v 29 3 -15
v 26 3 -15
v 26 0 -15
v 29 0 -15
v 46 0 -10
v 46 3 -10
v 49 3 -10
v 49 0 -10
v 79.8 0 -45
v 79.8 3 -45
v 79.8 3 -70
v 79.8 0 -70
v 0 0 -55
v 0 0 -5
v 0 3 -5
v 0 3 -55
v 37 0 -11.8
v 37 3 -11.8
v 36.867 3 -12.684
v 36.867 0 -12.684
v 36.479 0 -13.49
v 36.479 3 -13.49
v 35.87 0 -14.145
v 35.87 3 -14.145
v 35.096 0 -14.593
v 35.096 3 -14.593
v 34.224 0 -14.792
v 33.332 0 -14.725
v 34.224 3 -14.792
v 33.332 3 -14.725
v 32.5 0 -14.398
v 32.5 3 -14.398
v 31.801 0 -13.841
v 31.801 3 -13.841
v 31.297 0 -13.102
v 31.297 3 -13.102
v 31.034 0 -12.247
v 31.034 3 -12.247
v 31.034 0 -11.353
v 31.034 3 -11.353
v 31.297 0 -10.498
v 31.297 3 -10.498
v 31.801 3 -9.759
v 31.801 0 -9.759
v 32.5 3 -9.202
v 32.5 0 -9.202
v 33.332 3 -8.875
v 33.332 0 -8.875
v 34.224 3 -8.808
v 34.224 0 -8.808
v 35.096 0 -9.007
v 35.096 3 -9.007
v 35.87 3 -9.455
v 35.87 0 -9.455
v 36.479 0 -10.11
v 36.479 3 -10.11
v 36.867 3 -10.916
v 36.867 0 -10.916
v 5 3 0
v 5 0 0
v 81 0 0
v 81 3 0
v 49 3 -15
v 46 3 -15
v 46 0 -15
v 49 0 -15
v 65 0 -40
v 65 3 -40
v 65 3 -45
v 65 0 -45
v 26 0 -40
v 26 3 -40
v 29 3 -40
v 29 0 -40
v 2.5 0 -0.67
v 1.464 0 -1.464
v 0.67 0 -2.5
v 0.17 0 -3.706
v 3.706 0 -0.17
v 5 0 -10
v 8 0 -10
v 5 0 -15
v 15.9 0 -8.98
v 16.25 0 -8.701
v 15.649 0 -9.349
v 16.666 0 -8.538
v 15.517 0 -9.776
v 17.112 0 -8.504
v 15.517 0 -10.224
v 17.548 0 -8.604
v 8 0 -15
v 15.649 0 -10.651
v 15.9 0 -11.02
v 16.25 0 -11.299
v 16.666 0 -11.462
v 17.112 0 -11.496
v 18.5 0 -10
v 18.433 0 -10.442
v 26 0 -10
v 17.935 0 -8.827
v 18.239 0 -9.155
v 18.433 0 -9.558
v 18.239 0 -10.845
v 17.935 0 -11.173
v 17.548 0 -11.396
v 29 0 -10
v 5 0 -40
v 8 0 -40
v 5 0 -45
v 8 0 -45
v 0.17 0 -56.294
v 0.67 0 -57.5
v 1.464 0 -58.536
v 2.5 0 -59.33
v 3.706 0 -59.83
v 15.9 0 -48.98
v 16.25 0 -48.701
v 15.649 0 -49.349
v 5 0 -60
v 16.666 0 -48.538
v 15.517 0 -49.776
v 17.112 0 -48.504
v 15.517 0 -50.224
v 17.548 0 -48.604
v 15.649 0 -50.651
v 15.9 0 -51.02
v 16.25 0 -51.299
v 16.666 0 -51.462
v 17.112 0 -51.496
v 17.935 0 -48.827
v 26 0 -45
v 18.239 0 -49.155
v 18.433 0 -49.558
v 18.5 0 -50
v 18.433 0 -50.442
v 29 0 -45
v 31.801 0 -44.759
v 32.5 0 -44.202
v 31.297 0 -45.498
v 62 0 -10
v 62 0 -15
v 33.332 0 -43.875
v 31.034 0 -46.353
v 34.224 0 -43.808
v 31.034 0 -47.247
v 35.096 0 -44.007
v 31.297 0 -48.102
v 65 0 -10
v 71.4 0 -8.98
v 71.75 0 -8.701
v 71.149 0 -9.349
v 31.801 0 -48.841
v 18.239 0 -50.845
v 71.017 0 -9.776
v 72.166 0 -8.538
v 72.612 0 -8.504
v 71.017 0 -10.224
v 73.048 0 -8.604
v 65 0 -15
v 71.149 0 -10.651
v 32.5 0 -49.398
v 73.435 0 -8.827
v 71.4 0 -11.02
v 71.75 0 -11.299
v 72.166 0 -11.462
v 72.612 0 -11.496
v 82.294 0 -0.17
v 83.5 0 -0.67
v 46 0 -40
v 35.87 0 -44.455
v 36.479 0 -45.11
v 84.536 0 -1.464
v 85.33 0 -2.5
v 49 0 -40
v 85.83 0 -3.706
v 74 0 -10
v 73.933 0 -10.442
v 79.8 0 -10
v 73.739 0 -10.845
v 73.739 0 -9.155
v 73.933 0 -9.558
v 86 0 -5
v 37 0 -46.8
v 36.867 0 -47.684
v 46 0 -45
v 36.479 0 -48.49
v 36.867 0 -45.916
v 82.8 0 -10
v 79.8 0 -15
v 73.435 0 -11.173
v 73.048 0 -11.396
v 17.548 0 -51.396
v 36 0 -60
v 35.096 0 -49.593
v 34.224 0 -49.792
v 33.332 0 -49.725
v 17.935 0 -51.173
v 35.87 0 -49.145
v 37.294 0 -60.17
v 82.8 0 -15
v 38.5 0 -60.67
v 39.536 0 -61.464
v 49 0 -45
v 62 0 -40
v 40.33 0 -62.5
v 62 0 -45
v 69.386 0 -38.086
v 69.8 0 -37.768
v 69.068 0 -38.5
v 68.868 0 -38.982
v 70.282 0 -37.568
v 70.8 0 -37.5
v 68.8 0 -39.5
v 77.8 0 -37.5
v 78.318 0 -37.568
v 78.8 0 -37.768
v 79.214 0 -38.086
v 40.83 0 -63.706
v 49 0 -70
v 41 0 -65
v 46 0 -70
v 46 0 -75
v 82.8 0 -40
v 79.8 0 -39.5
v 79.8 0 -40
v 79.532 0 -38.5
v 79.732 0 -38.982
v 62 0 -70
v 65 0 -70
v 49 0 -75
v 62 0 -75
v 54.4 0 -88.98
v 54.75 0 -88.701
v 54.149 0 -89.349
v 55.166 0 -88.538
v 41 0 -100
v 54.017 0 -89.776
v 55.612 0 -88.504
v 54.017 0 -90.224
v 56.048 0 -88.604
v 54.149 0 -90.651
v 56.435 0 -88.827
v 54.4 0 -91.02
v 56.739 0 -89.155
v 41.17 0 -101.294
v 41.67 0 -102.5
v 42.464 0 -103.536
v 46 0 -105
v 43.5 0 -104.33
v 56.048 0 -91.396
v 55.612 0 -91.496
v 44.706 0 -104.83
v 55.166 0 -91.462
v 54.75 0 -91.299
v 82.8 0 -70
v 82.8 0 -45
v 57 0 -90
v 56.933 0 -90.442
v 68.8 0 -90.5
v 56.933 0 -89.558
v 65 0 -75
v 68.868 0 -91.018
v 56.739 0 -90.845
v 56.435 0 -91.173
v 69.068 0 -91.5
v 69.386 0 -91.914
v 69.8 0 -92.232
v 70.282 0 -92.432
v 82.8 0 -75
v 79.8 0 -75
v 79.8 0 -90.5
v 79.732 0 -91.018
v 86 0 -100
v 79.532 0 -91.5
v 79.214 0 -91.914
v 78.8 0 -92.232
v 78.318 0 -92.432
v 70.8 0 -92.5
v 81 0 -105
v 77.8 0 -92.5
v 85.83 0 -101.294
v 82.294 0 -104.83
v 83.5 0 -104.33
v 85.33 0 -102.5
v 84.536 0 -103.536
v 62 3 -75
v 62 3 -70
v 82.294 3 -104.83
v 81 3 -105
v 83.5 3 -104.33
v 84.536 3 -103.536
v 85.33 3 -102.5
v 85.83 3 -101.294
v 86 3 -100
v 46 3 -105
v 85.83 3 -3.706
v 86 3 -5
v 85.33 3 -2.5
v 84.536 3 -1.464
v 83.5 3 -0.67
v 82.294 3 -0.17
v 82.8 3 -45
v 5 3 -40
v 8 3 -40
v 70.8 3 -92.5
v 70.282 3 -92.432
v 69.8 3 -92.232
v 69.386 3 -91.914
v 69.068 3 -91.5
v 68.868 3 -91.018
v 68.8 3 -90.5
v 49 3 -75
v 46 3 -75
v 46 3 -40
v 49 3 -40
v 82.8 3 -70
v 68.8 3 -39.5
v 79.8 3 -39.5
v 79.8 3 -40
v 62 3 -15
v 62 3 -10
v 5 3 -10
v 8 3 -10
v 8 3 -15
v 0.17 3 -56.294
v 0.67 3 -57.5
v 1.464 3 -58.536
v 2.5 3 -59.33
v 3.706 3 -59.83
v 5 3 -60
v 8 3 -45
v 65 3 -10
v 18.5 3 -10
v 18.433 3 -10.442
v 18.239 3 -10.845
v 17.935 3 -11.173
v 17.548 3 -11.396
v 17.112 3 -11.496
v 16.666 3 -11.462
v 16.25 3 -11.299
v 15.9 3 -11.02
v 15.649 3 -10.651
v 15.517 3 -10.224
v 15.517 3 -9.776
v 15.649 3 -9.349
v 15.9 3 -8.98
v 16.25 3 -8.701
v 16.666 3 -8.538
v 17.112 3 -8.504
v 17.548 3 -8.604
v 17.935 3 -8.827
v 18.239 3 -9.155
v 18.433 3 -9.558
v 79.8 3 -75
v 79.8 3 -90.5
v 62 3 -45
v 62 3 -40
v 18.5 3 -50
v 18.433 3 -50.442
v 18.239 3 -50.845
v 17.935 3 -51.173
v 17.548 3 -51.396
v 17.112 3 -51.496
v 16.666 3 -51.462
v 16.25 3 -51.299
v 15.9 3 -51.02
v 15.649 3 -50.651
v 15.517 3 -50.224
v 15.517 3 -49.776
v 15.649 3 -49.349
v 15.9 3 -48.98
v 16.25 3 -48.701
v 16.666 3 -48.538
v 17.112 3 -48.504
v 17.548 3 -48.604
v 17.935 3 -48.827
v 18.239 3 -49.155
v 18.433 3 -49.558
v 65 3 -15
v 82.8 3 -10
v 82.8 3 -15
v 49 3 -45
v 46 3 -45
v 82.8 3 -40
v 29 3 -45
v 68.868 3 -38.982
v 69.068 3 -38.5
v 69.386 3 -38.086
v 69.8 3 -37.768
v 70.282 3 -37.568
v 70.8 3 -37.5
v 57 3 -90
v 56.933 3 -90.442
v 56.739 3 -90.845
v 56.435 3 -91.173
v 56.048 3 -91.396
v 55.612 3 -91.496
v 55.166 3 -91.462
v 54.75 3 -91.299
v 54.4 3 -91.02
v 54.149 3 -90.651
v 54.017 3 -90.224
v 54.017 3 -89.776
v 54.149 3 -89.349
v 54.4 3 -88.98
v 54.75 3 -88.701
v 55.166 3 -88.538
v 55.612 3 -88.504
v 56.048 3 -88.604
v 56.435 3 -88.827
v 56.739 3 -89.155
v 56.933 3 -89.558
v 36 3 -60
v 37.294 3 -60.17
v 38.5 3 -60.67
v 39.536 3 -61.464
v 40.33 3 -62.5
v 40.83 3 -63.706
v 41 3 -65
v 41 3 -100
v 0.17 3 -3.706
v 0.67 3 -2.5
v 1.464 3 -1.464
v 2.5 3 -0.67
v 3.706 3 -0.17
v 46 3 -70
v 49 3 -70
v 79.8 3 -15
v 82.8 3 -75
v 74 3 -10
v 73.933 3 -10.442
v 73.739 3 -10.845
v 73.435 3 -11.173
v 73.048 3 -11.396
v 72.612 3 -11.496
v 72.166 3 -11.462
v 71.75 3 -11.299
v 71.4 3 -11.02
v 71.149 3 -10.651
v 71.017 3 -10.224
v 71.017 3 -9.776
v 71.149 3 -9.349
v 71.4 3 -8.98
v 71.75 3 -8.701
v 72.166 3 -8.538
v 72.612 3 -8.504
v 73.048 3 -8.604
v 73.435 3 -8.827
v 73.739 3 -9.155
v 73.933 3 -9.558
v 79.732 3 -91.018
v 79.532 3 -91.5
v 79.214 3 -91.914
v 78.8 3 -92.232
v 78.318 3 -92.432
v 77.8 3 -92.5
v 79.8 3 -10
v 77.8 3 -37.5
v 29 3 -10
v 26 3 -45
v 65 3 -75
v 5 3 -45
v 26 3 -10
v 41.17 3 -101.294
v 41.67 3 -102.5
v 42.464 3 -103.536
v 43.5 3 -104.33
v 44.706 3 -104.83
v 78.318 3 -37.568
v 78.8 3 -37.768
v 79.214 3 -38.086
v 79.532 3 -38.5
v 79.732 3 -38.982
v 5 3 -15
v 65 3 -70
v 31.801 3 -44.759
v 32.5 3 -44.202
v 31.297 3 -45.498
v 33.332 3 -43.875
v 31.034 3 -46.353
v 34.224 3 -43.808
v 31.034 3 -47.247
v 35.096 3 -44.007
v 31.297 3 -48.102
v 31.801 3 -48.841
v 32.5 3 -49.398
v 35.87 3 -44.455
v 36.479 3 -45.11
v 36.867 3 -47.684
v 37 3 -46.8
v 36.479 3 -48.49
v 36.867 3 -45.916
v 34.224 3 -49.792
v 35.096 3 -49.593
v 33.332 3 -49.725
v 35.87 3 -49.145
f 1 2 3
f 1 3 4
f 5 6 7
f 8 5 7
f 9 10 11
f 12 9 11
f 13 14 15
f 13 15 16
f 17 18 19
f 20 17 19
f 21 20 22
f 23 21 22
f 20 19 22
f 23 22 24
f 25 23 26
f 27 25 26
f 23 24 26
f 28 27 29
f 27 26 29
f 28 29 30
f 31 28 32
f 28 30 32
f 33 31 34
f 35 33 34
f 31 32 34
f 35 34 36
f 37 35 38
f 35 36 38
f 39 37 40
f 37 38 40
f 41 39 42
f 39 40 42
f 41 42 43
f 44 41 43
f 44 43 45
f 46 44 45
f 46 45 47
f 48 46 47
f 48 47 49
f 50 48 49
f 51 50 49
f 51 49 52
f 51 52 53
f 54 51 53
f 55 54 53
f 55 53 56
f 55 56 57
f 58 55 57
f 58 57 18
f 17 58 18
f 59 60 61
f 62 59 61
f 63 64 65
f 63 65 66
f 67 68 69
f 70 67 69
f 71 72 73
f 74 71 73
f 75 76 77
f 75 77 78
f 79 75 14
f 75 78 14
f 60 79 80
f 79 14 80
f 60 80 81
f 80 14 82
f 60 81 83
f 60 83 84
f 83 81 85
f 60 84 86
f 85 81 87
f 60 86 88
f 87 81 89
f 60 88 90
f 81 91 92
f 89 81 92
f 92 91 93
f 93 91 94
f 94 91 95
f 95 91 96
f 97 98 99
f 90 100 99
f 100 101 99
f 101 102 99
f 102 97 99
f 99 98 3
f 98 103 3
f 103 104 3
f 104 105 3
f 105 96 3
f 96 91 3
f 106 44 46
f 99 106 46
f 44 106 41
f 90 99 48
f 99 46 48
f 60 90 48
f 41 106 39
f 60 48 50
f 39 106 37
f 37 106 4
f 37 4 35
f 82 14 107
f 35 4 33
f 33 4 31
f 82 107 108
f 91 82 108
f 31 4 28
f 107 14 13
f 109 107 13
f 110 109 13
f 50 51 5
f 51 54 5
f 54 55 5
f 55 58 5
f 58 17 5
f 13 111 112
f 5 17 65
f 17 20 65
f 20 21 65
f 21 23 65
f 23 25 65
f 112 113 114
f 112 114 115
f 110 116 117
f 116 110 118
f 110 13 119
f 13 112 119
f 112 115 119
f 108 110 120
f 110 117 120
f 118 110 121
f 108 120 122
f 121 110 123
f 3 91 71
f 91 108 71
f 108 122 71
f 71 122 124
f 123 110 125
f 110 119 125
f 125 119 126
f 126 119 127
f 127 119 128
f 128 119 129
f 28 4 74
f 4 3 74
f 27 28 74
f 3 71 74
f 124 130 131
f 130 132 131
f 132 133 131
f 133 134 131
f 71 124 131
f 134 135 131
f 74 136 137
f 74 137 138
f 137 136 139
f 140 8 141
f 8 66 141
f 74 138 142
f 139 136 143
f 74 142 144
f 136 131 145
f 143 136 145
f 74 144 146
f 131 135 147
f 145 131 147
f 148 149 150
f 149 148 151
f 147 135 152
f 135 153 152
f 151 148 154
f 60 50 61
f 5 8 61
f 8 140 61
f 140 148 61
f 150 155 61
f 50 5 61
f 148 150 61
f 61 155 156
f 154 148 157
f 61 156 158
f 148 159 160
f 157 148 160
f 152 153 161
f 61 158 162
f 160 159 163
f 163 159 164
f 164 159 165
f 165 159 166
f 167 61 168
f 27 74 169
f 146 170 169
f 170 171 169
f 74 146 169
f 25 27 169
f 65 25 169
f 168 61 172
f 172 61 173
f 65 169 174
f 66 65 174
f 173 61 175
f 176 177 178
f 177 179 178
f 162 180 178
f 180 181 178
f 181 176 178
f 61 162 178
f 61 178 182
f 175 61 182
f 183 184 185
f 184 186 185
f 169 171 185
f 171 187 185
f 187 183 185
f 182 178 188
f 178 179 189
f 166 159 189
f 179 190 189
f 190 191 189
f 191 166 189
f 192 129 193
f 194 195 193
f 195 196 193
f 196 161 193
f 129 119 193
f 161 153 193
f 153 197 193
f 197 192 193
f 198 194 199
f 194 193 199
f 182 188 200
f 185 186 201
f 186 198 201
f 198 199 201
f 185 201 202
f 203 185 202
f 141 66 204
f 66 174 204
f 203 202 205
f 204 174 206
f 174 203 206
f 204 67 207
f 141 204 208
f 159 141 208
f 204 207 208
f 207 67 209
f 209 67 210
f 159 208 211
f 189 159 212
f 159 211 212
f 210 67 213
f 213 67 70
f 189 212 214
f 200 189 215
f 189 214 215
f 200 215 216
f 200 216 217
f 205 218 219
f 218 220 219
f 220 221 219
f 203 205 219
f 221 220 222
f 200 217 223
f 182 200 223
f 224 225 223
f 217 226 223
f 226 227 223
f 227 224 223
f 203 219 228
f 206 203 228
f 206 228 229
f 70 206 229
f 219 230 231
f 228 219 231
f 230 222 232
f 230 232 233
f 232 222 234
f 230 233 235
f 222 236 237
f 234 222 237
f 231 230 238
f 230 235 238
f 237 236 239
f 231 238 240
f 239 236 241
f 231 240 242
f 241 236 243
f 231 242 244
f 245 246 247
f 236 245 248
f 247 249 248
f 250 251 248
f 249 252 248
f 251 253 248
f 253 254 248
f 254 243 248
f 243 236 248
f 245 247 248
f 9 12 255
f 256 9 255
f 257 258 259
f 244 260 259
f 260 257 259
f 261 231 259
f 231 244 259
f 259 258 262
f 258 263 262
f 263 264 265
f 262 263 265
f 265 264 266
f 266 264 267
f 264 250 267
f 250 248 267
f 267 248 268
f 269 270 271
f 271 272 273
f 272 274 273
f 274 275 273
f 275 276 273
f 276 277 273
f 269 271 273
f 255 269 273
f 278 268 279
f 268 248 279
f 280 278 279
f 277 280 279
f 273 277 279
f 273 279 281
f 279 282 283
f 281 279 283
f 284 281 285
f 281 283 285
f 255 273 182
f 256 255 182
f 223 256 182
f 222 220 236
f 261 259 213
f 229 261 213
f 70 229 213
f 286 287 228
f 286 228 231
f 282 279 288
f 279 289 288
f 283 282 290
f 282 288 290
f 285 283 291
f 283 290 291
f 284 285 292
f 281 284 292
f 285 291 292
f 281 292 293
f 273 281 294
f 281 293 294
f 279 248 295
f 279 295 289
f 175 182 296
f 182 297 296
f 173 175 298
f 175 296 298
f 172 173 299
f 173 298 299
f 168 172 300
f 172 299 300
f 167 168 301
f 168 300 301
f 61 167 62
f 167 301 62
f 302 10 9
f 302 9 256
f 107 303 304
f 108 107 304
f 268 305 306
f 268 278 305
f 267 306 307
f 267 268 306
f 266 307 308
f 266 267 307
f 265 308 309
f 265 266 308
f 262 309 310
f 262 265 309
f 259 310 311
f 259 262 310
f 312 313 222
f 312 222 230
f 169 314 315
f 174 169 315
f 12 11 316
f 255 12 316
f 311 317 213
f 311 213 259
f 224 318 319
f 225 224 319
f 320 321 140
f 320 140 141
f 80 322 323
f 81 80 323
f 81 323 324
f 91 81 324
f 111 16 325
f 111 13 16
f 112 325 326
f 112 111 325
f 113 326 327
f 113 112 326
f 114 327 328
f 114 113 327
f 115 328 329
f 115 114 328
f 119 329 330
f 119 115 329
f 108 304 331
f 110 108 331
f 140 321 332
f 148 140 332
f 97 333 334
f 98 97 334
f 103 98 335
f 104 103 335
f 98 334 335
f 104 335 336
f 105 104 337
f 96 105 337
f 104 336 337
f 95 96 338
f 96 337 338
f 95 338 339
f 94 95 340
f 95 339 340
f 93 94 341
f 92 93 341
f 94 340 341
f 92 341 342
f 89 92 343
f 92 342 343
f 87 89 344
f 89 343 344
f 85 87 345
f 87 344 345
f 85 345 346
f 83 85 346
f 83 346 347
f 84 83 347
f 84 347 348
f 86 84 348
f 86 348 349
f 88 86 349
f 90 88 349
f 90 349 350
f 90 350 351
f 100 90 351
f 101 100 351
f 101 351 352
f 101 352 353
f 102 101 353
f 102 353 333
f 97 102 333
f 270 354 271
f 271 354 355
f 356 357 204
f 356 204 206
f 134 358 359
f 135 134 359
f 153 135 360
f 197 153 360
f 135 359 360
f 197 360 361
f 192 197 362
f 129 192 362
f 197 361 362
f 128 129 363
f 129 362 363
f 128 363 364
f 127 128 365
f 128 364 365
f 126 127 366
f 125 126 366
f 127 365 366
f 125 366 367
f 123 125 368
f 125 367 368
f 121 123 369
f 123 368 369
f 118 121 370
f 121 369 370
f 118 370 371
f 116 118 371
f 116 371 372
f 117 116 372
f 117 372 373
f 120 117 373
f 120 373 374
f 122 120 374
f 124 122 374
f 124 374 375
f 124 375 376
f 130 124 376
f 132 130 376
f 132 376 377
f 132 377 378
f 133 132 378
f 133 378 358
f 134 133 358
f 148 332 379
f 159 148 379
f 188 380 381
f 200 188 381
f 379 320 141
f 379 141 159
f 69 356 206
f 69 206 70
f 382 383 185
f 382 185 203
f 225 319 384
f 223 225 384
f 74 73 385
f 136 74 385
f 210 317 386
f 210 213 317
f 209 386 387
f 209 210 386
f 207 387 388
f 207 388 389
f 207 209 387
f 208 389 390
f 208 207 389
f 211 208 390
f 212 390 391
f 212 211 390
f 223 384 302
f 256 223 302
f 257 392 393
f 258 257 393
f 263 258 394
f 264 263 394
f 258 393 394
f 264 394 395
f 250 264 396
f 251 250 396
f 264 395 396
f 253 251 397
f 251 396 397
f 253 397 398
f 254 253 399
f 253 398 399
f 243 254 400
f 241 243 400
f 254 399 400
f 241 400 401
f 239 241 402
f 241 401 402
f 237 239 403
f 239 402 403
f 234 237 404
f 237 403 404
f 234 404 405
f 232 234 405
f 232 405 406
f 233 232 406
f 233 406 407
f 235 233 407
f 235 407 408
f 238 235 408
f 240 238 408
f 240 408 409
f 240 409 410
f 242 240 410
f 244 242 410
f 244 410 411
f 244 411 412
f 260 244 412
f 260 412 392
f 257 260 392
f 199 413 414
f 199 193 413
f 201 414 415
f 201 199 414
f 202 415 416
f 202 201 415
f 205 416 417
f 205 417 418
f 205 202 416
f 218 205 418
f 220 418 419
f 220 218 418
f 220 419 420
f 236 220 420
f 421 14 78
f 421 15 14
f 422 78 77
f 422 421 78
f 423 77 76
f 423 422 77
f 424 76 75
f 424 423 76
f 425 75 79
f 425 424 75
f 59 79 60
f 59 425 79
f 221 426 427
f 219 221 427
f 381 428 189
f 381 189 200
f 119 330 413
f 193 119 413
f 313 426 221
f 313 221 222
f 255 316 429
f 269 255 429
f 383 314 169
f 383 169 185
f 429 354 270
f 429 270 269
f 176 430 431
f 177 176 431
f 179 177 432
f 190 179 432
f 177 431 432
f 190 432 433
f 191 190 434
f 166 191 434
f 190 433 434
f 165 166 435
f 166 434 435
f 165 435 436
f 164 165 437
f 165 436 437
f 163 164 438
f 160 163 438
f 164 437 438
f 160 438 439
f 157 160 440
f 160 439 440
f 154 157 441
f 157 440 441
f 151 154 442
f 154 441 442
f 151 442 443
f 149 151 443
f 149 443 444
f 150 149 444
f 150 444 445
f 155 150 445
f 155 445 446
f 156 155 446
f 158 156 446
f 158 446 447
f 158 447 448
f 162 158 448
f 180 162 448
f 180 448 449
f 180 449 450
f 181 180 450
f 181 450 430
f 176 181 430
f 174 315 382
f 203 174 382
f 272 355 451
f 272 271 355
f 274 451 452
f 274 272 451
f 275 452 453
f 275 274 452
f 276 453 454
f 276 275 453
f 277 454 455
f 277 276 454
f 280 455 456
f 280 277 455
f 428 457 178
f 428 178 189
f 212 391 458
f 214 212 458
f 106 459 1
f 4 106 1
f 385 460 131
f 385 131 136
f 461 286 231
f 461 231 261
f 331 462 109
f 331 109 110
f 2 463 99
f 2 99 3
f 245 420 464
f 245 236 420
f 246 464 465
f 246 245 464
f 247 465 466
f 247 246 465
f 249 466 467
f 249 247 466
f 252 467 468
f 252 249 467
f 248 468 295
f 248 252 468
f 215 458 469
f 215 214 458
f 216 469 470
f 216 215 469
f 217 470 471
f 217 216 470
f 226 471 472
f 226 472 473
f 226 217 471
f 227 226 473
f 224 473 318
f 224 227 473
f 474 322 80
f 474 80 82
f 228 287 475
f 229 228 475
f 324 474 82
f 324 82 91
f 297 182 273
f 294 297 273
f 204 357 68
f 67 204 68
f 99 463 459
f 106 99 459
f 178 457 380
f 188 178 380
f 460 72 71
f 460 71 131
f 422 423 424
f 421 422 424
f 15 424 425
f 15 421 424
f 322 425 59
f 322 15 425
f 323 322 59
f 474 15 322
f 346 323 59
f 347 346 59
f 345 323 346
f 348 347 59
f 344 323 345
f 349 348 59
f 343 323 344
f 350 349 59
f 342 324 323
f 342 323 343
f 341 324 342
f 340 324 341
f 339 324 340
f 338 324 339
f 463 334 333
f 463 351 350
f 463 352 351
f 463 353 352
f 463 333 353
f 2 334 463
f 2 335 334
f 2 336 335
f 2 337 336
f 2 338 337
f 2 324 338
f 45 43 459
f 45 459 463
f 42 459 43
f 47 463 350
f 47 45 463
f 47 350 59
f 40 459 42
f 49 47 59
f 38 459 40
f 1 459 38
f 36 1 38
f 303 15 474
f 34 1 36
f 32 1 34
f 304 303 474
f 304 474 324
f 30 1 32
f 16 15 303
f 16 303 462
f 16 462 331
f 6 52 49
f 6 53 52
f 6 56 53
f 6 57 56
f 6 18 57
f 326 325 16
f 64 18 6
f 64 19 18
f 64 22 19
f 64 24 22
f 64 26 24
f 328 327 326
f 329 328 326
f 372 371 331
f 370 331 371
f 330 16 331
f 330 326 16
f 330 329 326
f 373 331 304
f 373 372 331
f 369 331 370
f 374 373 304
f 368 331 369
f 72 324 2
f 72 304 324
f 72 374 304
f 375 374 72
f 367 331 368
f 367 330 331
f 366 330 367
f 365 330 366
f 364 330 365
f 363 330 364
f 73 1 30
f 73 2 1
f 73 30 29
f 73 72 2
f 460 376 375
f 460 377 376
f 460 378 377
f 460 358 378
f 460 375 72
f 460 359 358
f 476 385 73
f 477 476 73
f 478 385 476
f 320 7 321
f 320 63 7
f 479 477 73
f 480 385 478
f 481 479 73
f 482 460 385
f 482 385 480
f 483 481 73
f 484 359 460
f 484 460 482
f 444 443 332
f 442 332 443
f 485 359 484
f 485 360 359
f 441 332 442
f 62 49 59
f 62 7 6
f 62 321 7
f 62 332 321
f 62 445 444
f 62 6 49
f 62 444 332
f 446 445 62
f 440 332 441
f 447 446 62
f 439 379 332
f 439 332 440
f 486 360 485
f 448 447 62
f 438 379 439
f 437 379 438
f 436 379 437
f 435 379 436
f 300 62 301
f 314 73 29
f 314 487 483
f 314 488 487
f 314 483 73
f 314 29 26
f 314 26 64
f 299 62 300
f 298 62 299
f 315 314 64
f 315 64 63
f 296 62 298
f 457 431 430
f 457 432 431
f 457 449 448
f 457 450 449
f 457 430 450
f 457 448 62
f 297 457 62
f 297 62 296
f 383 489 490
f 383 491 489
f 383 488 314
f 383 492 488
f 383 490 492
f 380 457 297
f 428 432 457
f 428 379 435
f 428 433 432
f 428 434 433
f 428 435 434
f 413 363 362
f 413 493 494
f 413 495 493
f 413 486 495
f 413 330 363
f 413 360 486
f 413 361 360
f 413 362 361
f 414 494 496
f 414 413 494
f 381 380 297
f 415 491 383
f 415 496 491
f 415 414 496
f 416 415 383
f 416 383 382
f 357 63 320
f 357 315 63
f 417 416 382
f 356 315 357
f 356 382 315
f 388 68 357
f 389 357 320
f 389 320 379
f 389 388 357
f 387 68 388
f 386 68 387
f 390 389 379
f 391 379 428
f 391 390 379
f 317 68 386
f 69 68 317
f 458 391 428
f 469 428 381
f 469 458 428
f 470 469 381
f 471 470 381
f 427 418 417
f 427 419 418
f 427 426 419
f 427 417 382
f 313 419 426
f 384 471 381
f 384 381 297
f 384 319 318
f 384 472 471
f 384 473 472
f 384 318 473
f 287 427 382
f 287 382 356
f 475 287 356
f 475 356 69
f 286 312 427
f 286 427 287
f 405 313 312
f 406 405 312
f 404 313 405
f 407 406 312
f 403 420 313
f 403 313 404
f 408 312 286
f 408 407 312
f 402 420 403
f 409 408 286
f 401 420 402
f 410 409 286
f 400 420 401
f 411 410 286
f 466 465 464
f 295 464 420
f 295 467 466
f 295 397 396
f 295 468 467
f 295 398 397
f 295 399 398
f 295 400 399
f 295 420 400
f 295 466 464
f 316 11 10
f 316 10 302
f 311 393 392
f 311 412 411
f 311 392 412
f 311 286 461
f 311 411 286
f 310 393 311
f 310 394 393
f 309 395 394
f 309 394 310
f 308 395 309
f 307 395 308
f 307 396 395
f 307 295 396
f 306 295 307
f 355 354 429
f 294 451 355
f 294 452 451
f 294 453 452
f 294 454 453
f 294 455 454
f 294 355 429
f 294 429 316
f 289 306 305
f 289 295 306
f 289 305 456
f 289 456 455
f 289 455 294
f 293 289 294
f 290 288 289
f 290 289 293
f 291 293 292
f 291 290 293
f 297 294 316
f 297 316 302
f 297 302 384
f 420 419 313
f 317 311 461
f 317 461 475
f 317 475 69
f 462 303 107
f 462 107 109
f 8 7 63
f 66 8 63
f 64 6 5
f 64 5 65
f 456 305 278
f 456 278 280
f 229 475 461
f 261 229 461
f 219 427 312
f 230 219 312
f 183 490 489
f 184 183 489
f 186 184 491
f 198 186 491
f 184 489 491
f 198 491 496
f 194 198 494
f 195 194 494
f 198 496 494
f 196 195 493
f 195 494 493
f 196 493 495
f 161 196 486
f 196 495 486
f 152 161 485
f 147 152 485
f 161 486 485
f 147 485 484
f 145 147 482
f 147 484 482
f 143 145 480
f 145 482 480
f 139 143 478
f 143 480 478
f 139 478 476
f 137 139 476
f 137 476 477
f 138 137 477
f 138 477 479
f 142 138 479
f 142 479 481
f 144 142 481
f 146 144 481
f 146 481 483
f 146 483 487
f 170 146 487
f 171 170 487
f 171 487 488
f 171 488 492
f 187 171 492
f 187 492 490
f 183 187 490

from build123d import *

# Parameters (mm, degrees)
SKETCH1_W           = 86
SKETCH1_H           = 105
BOSS_EXTRUDE1_DEPTH = 3
SKETCH2_W           = 3
SKETCH2_H           = 5
CUT_EXTRUDE1_DEPTH  = 3
LPATTERN1_COUNT     = 3
LPATTERN1_PITCH     = 30
SKETCH5_R           = 1.5
CUT_EXTRUDE2_DEPTH  = 4
SKETCH6_R           = 3
SKETCH6_W           = 11
SKETCH6_H           = 55
CUT_EXTRUDE3_DEPTH  = 4
FILLET2_R           = 2
SKETCH7_W           = 41
SKETCH7_H           = 45
CUT_EXTRUDE4_DEPTH  = 4
FILLET3_R           = 5


with BuildPart() as part:
    # Sketch1 → Boss-Extrude1 (new body)
    with BuildSketch(Plane(origin=(0, 0, 0), x_dir=(1, 0, 0), z_dir=(0, 1, 0))):
        with Locations((43, 52.5)):
            Rectangle(SKETCH1_W, SKETCH1_H)
    extrude(amount=BOSS_EXTRUDE1_DEPTH)

    # Sketch2 → Cut-Extrude1 (cut)
    with BuildSketch(Plane(origin=(0, 3, 0), x_dir=(1, 0, 0), z_dir=(0, 1, 0))):
        with Locations((63.5, 12.5)):
            Rectangle(SKETCH2_W, SKETCH2_H)
        with Locations((47.5, 12.5)):
            Rectangle(SKETCH2_W, SKETCH2_H)
        with Locations((27.5, 12.5)):
            Rectangle(SKETCH2_W, SKETCH2_H)
        with Locations((6.5, 12.5)):
            Rectangle(SKETCH2_W, SKETCH2_H)
        with Locations((81.3, 12.5)):
            Rectangle(SKETCH2_W, SKETCH2_H)
    cut_extrude1 = extrude(amount=-CUT_EXTRUDE1_DEPTH, mode=Mode.SUBTRACT)

    # LPattern1: Cut-Extrude1 ×3
    with Locations(*[(0, 0, -i * LPATTERN1_PITCH) for i in range(1, LPATTERN1_COUNT)]):
        add(cut_extrude1, mode=Mode.SUBTRACT)

    # Sketch5 → Cut-Extrude2 (cut, through all)
    with BuildSketch(Plane(origin=(0, 3, 0), x_dir=(1, 0, 0), z_dir=(0, 1, 0))):
        with Locations((17, 10)):
            Circle(SKETCH5_R)
        with Locations((17, 50)):
            Circle(SKETCH5_R)
        with Locations((72.5, 10)):
            Circle(SKETCH5_R)
        with Locations((55.5, 90)):
            Circle(SKETCH5_R)
    extrude(amount=-CUT_EXTRUDE2_DEPTH, mode=Mode.SUBTRACT)

    # Sketch6 → Cut-Extrude3 (cut, through all)
    with BuildSketch(Plane(origin=(0, 3, 0), x_dir=(1, 0, 0), z_dir=(0, 1, 0))):
        with Locations((34, 11.8)):
            Circle(SKETCH6_R)
        with Locations((34, 46.8)):
            Circle(SKETCH6_R)
        with Locations((74.3, 65)):
            Rectangle(SKETCH6_W, SKETCH6_H)
    extrude(amount=-CUT_EXTRUDE3_DEPTH, mode=Mode.SUBTRACT)

    # Fillet2
    fillet2_edges = [part.edges().sort_by_distance(p)[0] for p in [
        (79.8, 1.5, -92.5),
        (68.8, 1.5, -37.5),
        (68.8, 1.5, -92.5),
        (79.8, 1.5, -37.5),
    ]]
    fillet(fillet2_edges, radius=FILLET2_R)

    # Sketch7 → Cut-Extrude4 (cut, through all)
    with BuildSketch(Plane(origin=(0, 3, 0), x_dir=(1, 0, 0), z_dir=(0, 1, 0))):
        with Locations((20.5, 82.5)):
            Rectangle(SKETCH7_W, SKETCH7_H)
    extrude(amount=-CUT_EXTRUDE4_DEPTH, mode=Mode.SUBTRACT)

    # Fillet3
    fillet3_edges = [part.edges().sort_by_distance(p)[0] for p in [
        (0, 1.5, -60),
        (41, 1.5, -105),
        (41, 1.5, -60),
        (86, 1.5, -105),
        (86, 1.5, 0),
        (0, 1.5, 0),
    ]]
    fillet(fillet3_edges, radius=FILLET3_R)


solid = part.part
